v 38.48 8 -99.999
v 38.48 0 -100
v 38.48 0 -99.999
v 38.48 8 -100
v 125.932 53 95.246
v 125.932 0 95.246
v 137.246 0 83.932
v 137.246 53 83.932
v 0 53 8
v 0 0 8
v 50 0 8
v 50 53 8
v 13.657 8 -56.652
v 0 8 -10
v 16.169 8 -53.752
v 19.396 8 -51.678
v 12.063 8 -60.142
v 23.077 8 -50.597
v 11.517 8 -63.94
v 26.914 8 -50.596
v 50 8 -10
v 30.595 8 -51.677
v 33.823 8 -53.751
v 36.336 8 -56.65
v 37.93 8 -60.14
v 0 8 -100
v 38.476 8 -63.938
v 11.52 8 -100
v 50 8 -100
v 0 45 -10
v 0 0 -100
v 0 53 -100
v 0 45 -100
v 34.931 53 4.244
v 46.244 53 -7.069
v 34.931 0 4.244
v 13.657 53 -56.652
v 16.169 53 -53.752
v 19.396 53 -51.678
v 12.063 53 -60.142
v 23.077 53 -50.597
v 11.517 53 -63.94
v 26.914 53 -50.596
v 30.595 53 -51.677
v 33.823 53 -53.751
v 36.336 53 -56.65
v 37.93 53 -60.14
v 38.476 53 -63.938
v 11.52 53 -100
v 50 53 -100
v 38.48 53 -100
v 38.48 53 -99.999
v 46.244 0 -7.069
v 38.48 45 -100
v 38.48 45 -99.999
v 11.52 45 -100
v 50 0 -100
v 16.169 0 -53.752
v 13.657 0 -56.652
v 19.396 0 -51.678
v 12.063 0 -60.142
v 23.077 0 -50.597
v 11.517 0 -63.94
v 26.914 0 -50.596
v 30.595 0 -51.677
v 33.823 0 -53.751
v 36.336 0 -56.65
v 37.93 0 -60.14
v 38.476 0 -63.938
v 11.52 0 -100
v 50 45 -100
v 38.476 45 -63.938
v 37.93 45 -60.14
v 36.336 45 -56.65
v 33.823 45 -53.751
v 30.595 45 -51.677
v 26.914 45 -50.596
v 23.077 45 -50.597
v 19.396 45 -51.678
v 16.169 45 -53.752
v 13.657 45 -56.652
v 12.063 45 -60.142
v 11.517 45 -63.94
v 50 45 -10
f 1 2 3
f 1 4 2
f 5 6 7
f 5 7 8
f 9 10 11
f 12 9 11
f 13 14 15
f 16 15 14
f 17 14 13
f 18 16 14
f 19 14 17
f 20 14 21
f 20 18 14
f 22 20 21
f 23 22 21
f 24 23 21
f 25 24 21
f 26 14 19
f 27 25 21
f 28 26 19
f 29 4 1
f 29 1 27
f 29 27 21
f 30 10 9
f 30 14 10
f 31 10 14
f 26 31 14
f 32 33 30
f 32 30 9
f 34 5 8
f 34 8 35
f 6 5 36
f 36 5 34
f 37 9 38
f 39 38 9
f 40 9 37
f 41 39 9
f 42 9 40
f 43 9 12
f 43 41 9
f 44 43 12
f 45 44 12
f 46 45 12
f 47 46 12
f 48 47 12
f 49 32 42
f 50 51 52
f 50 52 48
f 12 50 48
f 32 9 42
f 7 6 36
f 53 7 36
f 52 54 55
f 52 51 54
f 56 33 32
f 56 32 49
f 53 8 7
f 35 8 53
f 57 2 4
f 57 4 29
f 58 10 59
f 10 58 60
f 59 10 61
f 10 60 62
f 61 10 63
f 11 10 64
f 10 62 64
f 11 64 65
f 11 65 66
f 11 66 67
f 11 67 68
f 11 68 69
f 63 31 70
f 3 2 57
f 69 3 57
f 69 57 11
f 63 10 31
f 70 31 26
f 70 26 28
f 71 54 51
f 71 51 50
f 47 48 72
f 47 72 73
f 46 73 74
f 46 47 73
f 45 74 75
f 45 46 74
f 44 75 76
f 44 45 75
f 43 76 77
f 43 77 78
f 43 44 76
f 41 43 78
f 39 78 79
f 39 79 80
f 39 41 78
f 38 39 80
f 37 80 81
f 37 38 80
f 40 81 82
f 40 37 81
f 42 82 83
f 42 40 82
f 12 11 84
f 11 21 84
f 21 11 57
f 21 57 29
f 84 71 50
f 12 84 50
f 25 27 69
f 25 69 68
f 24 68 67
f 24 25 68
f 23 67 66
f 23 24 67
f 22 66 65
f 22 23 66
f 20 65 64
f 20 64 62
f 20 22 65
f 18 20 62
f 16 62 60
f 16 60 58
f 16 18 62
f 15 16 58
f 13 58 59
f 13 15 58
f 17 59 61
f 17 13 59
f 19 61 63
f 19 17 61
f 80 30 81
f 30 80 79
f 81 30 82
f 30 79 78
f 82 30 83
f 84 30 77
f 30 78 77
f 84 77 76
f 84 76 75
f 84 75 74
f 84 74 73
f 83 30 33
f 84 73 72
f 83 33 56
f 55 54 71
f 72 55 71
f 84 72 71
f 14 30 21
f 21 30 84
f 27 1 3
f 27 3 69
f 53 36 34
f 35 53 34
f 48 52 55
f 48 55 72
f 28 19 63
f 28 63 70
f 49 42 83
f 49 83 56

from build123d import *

# Parameters (mm, degrees)
SKETCH1_W                = 50
SKETCH1_H                = 100
BOSS_EXTRUDE1_DEPTH      = 8
CUT_EXTRUDE1_DEPTH       = 8
LPATTERN1_COUNT          = 2
LPATTERN1_PITCH          = 45
BOSS_EXTRUDE2_DEPTH      = 8
BOSS_EXTRUDE2_DEPTH_BACK = 10
SKETCH3_W                = 50
SKETCH3_H                = 53
BOSS_EXTRUDE3_DEPTH      = 8
BOSS_EXTRUDE3_DEPTH_BACK = 8
SKETCH4_W                = 128.695408592
SKETCH4_H                = 53


with BuildPart() as part:
    # Sketch1 → Boss-Extrude1 (new body)
    with BuildSketch(Plane(origin=(0, 0, 0), x_dir=(1, 0, 0), z_dir=(0, 1, 0))):
        with Locations((25, 50)):
            Rectangle(SKETCH1_W, SKETCH1_H)
    extrude(amount=BOSS_EXTRUDE1_DEPTH)

    # Sketch2 → Cut-Extrude1 (cut)
    with BuildSketch(Plane(origin=(0, 8, 0), x_dir=(1, 0, 0), z_dir=(0, 1, 0))):
        with BuildLine():
            Line((11.517328483, 63.940028427), (11.520448458, 100.001166238))
            ThreePointArc((11.520448458, 100.001166238), (25.001166238, 113.479551542), (38.479551542, 99.998833762))
            Line((38.479551542, 99.998833762), (38.476431567, 63.937695952))
            ThreePointArc((38.476431567, 63.937695952), (24.995713787, 50.459310648), (11.517328483, 63.940028427))
        make_face()
    extrude(amount=-CUT_EXTRUDE1_DEPTH, mode=Mode.SUBTRACT)


with BuildPart() as lpattern1_1:
    # LPattern1: pattern copy
    add(part.part.moved(Location(Vector(0, 1, 0) * (1 * LPATTERN1_PITCH))))


with BuildPart() as part_1:
    add(part.part)

    add(lpattern1_1.part)  # Boss-Extrude2 merges LPattern1_1
    # Sketch3 → Boss-Extrude2 (add, two sides: drawn at the far end of the back side and taken through both)
    with BuildSketch(Plane.XY.offset(-BOSS_EXTRUDE2_DEPTH_BACK)):
        with Locations((25, 26.5)):
            Rectangle(SKETCH3_W, SKETCH3_H)
    extrude(amount=BOSS_EXTRUDE2_DEPTH + BOSS_EXTRUDE2_DEPTH_BACK)


with BuildPart() as body_2:
    # Sketch4 → Boss-Extrude3 (new, two sides: drawn at the far end of the back side and taken through both)
    with BuildSketch(Plane(origin=(21, 0, -21), x_dir=(-0.7071067811865476, 0, -0.7071067811865475), z_dir=(0.7071067811865475, 0, -0.7071067811865476)).offset(-BOSS_EXTRUDE3_DEPTH_BACK)):
        with Locations((-92.048704228, 26.5)):
            Rectangle(SKETCH4_W, SKETCH4_H)
    extrude(amount=BOSS_EXTRUDE3_DEPTH + BOSS_EXTRUDE3_DEPTH_BACK)


solid = Compound([part_1.part, body_2.part])
